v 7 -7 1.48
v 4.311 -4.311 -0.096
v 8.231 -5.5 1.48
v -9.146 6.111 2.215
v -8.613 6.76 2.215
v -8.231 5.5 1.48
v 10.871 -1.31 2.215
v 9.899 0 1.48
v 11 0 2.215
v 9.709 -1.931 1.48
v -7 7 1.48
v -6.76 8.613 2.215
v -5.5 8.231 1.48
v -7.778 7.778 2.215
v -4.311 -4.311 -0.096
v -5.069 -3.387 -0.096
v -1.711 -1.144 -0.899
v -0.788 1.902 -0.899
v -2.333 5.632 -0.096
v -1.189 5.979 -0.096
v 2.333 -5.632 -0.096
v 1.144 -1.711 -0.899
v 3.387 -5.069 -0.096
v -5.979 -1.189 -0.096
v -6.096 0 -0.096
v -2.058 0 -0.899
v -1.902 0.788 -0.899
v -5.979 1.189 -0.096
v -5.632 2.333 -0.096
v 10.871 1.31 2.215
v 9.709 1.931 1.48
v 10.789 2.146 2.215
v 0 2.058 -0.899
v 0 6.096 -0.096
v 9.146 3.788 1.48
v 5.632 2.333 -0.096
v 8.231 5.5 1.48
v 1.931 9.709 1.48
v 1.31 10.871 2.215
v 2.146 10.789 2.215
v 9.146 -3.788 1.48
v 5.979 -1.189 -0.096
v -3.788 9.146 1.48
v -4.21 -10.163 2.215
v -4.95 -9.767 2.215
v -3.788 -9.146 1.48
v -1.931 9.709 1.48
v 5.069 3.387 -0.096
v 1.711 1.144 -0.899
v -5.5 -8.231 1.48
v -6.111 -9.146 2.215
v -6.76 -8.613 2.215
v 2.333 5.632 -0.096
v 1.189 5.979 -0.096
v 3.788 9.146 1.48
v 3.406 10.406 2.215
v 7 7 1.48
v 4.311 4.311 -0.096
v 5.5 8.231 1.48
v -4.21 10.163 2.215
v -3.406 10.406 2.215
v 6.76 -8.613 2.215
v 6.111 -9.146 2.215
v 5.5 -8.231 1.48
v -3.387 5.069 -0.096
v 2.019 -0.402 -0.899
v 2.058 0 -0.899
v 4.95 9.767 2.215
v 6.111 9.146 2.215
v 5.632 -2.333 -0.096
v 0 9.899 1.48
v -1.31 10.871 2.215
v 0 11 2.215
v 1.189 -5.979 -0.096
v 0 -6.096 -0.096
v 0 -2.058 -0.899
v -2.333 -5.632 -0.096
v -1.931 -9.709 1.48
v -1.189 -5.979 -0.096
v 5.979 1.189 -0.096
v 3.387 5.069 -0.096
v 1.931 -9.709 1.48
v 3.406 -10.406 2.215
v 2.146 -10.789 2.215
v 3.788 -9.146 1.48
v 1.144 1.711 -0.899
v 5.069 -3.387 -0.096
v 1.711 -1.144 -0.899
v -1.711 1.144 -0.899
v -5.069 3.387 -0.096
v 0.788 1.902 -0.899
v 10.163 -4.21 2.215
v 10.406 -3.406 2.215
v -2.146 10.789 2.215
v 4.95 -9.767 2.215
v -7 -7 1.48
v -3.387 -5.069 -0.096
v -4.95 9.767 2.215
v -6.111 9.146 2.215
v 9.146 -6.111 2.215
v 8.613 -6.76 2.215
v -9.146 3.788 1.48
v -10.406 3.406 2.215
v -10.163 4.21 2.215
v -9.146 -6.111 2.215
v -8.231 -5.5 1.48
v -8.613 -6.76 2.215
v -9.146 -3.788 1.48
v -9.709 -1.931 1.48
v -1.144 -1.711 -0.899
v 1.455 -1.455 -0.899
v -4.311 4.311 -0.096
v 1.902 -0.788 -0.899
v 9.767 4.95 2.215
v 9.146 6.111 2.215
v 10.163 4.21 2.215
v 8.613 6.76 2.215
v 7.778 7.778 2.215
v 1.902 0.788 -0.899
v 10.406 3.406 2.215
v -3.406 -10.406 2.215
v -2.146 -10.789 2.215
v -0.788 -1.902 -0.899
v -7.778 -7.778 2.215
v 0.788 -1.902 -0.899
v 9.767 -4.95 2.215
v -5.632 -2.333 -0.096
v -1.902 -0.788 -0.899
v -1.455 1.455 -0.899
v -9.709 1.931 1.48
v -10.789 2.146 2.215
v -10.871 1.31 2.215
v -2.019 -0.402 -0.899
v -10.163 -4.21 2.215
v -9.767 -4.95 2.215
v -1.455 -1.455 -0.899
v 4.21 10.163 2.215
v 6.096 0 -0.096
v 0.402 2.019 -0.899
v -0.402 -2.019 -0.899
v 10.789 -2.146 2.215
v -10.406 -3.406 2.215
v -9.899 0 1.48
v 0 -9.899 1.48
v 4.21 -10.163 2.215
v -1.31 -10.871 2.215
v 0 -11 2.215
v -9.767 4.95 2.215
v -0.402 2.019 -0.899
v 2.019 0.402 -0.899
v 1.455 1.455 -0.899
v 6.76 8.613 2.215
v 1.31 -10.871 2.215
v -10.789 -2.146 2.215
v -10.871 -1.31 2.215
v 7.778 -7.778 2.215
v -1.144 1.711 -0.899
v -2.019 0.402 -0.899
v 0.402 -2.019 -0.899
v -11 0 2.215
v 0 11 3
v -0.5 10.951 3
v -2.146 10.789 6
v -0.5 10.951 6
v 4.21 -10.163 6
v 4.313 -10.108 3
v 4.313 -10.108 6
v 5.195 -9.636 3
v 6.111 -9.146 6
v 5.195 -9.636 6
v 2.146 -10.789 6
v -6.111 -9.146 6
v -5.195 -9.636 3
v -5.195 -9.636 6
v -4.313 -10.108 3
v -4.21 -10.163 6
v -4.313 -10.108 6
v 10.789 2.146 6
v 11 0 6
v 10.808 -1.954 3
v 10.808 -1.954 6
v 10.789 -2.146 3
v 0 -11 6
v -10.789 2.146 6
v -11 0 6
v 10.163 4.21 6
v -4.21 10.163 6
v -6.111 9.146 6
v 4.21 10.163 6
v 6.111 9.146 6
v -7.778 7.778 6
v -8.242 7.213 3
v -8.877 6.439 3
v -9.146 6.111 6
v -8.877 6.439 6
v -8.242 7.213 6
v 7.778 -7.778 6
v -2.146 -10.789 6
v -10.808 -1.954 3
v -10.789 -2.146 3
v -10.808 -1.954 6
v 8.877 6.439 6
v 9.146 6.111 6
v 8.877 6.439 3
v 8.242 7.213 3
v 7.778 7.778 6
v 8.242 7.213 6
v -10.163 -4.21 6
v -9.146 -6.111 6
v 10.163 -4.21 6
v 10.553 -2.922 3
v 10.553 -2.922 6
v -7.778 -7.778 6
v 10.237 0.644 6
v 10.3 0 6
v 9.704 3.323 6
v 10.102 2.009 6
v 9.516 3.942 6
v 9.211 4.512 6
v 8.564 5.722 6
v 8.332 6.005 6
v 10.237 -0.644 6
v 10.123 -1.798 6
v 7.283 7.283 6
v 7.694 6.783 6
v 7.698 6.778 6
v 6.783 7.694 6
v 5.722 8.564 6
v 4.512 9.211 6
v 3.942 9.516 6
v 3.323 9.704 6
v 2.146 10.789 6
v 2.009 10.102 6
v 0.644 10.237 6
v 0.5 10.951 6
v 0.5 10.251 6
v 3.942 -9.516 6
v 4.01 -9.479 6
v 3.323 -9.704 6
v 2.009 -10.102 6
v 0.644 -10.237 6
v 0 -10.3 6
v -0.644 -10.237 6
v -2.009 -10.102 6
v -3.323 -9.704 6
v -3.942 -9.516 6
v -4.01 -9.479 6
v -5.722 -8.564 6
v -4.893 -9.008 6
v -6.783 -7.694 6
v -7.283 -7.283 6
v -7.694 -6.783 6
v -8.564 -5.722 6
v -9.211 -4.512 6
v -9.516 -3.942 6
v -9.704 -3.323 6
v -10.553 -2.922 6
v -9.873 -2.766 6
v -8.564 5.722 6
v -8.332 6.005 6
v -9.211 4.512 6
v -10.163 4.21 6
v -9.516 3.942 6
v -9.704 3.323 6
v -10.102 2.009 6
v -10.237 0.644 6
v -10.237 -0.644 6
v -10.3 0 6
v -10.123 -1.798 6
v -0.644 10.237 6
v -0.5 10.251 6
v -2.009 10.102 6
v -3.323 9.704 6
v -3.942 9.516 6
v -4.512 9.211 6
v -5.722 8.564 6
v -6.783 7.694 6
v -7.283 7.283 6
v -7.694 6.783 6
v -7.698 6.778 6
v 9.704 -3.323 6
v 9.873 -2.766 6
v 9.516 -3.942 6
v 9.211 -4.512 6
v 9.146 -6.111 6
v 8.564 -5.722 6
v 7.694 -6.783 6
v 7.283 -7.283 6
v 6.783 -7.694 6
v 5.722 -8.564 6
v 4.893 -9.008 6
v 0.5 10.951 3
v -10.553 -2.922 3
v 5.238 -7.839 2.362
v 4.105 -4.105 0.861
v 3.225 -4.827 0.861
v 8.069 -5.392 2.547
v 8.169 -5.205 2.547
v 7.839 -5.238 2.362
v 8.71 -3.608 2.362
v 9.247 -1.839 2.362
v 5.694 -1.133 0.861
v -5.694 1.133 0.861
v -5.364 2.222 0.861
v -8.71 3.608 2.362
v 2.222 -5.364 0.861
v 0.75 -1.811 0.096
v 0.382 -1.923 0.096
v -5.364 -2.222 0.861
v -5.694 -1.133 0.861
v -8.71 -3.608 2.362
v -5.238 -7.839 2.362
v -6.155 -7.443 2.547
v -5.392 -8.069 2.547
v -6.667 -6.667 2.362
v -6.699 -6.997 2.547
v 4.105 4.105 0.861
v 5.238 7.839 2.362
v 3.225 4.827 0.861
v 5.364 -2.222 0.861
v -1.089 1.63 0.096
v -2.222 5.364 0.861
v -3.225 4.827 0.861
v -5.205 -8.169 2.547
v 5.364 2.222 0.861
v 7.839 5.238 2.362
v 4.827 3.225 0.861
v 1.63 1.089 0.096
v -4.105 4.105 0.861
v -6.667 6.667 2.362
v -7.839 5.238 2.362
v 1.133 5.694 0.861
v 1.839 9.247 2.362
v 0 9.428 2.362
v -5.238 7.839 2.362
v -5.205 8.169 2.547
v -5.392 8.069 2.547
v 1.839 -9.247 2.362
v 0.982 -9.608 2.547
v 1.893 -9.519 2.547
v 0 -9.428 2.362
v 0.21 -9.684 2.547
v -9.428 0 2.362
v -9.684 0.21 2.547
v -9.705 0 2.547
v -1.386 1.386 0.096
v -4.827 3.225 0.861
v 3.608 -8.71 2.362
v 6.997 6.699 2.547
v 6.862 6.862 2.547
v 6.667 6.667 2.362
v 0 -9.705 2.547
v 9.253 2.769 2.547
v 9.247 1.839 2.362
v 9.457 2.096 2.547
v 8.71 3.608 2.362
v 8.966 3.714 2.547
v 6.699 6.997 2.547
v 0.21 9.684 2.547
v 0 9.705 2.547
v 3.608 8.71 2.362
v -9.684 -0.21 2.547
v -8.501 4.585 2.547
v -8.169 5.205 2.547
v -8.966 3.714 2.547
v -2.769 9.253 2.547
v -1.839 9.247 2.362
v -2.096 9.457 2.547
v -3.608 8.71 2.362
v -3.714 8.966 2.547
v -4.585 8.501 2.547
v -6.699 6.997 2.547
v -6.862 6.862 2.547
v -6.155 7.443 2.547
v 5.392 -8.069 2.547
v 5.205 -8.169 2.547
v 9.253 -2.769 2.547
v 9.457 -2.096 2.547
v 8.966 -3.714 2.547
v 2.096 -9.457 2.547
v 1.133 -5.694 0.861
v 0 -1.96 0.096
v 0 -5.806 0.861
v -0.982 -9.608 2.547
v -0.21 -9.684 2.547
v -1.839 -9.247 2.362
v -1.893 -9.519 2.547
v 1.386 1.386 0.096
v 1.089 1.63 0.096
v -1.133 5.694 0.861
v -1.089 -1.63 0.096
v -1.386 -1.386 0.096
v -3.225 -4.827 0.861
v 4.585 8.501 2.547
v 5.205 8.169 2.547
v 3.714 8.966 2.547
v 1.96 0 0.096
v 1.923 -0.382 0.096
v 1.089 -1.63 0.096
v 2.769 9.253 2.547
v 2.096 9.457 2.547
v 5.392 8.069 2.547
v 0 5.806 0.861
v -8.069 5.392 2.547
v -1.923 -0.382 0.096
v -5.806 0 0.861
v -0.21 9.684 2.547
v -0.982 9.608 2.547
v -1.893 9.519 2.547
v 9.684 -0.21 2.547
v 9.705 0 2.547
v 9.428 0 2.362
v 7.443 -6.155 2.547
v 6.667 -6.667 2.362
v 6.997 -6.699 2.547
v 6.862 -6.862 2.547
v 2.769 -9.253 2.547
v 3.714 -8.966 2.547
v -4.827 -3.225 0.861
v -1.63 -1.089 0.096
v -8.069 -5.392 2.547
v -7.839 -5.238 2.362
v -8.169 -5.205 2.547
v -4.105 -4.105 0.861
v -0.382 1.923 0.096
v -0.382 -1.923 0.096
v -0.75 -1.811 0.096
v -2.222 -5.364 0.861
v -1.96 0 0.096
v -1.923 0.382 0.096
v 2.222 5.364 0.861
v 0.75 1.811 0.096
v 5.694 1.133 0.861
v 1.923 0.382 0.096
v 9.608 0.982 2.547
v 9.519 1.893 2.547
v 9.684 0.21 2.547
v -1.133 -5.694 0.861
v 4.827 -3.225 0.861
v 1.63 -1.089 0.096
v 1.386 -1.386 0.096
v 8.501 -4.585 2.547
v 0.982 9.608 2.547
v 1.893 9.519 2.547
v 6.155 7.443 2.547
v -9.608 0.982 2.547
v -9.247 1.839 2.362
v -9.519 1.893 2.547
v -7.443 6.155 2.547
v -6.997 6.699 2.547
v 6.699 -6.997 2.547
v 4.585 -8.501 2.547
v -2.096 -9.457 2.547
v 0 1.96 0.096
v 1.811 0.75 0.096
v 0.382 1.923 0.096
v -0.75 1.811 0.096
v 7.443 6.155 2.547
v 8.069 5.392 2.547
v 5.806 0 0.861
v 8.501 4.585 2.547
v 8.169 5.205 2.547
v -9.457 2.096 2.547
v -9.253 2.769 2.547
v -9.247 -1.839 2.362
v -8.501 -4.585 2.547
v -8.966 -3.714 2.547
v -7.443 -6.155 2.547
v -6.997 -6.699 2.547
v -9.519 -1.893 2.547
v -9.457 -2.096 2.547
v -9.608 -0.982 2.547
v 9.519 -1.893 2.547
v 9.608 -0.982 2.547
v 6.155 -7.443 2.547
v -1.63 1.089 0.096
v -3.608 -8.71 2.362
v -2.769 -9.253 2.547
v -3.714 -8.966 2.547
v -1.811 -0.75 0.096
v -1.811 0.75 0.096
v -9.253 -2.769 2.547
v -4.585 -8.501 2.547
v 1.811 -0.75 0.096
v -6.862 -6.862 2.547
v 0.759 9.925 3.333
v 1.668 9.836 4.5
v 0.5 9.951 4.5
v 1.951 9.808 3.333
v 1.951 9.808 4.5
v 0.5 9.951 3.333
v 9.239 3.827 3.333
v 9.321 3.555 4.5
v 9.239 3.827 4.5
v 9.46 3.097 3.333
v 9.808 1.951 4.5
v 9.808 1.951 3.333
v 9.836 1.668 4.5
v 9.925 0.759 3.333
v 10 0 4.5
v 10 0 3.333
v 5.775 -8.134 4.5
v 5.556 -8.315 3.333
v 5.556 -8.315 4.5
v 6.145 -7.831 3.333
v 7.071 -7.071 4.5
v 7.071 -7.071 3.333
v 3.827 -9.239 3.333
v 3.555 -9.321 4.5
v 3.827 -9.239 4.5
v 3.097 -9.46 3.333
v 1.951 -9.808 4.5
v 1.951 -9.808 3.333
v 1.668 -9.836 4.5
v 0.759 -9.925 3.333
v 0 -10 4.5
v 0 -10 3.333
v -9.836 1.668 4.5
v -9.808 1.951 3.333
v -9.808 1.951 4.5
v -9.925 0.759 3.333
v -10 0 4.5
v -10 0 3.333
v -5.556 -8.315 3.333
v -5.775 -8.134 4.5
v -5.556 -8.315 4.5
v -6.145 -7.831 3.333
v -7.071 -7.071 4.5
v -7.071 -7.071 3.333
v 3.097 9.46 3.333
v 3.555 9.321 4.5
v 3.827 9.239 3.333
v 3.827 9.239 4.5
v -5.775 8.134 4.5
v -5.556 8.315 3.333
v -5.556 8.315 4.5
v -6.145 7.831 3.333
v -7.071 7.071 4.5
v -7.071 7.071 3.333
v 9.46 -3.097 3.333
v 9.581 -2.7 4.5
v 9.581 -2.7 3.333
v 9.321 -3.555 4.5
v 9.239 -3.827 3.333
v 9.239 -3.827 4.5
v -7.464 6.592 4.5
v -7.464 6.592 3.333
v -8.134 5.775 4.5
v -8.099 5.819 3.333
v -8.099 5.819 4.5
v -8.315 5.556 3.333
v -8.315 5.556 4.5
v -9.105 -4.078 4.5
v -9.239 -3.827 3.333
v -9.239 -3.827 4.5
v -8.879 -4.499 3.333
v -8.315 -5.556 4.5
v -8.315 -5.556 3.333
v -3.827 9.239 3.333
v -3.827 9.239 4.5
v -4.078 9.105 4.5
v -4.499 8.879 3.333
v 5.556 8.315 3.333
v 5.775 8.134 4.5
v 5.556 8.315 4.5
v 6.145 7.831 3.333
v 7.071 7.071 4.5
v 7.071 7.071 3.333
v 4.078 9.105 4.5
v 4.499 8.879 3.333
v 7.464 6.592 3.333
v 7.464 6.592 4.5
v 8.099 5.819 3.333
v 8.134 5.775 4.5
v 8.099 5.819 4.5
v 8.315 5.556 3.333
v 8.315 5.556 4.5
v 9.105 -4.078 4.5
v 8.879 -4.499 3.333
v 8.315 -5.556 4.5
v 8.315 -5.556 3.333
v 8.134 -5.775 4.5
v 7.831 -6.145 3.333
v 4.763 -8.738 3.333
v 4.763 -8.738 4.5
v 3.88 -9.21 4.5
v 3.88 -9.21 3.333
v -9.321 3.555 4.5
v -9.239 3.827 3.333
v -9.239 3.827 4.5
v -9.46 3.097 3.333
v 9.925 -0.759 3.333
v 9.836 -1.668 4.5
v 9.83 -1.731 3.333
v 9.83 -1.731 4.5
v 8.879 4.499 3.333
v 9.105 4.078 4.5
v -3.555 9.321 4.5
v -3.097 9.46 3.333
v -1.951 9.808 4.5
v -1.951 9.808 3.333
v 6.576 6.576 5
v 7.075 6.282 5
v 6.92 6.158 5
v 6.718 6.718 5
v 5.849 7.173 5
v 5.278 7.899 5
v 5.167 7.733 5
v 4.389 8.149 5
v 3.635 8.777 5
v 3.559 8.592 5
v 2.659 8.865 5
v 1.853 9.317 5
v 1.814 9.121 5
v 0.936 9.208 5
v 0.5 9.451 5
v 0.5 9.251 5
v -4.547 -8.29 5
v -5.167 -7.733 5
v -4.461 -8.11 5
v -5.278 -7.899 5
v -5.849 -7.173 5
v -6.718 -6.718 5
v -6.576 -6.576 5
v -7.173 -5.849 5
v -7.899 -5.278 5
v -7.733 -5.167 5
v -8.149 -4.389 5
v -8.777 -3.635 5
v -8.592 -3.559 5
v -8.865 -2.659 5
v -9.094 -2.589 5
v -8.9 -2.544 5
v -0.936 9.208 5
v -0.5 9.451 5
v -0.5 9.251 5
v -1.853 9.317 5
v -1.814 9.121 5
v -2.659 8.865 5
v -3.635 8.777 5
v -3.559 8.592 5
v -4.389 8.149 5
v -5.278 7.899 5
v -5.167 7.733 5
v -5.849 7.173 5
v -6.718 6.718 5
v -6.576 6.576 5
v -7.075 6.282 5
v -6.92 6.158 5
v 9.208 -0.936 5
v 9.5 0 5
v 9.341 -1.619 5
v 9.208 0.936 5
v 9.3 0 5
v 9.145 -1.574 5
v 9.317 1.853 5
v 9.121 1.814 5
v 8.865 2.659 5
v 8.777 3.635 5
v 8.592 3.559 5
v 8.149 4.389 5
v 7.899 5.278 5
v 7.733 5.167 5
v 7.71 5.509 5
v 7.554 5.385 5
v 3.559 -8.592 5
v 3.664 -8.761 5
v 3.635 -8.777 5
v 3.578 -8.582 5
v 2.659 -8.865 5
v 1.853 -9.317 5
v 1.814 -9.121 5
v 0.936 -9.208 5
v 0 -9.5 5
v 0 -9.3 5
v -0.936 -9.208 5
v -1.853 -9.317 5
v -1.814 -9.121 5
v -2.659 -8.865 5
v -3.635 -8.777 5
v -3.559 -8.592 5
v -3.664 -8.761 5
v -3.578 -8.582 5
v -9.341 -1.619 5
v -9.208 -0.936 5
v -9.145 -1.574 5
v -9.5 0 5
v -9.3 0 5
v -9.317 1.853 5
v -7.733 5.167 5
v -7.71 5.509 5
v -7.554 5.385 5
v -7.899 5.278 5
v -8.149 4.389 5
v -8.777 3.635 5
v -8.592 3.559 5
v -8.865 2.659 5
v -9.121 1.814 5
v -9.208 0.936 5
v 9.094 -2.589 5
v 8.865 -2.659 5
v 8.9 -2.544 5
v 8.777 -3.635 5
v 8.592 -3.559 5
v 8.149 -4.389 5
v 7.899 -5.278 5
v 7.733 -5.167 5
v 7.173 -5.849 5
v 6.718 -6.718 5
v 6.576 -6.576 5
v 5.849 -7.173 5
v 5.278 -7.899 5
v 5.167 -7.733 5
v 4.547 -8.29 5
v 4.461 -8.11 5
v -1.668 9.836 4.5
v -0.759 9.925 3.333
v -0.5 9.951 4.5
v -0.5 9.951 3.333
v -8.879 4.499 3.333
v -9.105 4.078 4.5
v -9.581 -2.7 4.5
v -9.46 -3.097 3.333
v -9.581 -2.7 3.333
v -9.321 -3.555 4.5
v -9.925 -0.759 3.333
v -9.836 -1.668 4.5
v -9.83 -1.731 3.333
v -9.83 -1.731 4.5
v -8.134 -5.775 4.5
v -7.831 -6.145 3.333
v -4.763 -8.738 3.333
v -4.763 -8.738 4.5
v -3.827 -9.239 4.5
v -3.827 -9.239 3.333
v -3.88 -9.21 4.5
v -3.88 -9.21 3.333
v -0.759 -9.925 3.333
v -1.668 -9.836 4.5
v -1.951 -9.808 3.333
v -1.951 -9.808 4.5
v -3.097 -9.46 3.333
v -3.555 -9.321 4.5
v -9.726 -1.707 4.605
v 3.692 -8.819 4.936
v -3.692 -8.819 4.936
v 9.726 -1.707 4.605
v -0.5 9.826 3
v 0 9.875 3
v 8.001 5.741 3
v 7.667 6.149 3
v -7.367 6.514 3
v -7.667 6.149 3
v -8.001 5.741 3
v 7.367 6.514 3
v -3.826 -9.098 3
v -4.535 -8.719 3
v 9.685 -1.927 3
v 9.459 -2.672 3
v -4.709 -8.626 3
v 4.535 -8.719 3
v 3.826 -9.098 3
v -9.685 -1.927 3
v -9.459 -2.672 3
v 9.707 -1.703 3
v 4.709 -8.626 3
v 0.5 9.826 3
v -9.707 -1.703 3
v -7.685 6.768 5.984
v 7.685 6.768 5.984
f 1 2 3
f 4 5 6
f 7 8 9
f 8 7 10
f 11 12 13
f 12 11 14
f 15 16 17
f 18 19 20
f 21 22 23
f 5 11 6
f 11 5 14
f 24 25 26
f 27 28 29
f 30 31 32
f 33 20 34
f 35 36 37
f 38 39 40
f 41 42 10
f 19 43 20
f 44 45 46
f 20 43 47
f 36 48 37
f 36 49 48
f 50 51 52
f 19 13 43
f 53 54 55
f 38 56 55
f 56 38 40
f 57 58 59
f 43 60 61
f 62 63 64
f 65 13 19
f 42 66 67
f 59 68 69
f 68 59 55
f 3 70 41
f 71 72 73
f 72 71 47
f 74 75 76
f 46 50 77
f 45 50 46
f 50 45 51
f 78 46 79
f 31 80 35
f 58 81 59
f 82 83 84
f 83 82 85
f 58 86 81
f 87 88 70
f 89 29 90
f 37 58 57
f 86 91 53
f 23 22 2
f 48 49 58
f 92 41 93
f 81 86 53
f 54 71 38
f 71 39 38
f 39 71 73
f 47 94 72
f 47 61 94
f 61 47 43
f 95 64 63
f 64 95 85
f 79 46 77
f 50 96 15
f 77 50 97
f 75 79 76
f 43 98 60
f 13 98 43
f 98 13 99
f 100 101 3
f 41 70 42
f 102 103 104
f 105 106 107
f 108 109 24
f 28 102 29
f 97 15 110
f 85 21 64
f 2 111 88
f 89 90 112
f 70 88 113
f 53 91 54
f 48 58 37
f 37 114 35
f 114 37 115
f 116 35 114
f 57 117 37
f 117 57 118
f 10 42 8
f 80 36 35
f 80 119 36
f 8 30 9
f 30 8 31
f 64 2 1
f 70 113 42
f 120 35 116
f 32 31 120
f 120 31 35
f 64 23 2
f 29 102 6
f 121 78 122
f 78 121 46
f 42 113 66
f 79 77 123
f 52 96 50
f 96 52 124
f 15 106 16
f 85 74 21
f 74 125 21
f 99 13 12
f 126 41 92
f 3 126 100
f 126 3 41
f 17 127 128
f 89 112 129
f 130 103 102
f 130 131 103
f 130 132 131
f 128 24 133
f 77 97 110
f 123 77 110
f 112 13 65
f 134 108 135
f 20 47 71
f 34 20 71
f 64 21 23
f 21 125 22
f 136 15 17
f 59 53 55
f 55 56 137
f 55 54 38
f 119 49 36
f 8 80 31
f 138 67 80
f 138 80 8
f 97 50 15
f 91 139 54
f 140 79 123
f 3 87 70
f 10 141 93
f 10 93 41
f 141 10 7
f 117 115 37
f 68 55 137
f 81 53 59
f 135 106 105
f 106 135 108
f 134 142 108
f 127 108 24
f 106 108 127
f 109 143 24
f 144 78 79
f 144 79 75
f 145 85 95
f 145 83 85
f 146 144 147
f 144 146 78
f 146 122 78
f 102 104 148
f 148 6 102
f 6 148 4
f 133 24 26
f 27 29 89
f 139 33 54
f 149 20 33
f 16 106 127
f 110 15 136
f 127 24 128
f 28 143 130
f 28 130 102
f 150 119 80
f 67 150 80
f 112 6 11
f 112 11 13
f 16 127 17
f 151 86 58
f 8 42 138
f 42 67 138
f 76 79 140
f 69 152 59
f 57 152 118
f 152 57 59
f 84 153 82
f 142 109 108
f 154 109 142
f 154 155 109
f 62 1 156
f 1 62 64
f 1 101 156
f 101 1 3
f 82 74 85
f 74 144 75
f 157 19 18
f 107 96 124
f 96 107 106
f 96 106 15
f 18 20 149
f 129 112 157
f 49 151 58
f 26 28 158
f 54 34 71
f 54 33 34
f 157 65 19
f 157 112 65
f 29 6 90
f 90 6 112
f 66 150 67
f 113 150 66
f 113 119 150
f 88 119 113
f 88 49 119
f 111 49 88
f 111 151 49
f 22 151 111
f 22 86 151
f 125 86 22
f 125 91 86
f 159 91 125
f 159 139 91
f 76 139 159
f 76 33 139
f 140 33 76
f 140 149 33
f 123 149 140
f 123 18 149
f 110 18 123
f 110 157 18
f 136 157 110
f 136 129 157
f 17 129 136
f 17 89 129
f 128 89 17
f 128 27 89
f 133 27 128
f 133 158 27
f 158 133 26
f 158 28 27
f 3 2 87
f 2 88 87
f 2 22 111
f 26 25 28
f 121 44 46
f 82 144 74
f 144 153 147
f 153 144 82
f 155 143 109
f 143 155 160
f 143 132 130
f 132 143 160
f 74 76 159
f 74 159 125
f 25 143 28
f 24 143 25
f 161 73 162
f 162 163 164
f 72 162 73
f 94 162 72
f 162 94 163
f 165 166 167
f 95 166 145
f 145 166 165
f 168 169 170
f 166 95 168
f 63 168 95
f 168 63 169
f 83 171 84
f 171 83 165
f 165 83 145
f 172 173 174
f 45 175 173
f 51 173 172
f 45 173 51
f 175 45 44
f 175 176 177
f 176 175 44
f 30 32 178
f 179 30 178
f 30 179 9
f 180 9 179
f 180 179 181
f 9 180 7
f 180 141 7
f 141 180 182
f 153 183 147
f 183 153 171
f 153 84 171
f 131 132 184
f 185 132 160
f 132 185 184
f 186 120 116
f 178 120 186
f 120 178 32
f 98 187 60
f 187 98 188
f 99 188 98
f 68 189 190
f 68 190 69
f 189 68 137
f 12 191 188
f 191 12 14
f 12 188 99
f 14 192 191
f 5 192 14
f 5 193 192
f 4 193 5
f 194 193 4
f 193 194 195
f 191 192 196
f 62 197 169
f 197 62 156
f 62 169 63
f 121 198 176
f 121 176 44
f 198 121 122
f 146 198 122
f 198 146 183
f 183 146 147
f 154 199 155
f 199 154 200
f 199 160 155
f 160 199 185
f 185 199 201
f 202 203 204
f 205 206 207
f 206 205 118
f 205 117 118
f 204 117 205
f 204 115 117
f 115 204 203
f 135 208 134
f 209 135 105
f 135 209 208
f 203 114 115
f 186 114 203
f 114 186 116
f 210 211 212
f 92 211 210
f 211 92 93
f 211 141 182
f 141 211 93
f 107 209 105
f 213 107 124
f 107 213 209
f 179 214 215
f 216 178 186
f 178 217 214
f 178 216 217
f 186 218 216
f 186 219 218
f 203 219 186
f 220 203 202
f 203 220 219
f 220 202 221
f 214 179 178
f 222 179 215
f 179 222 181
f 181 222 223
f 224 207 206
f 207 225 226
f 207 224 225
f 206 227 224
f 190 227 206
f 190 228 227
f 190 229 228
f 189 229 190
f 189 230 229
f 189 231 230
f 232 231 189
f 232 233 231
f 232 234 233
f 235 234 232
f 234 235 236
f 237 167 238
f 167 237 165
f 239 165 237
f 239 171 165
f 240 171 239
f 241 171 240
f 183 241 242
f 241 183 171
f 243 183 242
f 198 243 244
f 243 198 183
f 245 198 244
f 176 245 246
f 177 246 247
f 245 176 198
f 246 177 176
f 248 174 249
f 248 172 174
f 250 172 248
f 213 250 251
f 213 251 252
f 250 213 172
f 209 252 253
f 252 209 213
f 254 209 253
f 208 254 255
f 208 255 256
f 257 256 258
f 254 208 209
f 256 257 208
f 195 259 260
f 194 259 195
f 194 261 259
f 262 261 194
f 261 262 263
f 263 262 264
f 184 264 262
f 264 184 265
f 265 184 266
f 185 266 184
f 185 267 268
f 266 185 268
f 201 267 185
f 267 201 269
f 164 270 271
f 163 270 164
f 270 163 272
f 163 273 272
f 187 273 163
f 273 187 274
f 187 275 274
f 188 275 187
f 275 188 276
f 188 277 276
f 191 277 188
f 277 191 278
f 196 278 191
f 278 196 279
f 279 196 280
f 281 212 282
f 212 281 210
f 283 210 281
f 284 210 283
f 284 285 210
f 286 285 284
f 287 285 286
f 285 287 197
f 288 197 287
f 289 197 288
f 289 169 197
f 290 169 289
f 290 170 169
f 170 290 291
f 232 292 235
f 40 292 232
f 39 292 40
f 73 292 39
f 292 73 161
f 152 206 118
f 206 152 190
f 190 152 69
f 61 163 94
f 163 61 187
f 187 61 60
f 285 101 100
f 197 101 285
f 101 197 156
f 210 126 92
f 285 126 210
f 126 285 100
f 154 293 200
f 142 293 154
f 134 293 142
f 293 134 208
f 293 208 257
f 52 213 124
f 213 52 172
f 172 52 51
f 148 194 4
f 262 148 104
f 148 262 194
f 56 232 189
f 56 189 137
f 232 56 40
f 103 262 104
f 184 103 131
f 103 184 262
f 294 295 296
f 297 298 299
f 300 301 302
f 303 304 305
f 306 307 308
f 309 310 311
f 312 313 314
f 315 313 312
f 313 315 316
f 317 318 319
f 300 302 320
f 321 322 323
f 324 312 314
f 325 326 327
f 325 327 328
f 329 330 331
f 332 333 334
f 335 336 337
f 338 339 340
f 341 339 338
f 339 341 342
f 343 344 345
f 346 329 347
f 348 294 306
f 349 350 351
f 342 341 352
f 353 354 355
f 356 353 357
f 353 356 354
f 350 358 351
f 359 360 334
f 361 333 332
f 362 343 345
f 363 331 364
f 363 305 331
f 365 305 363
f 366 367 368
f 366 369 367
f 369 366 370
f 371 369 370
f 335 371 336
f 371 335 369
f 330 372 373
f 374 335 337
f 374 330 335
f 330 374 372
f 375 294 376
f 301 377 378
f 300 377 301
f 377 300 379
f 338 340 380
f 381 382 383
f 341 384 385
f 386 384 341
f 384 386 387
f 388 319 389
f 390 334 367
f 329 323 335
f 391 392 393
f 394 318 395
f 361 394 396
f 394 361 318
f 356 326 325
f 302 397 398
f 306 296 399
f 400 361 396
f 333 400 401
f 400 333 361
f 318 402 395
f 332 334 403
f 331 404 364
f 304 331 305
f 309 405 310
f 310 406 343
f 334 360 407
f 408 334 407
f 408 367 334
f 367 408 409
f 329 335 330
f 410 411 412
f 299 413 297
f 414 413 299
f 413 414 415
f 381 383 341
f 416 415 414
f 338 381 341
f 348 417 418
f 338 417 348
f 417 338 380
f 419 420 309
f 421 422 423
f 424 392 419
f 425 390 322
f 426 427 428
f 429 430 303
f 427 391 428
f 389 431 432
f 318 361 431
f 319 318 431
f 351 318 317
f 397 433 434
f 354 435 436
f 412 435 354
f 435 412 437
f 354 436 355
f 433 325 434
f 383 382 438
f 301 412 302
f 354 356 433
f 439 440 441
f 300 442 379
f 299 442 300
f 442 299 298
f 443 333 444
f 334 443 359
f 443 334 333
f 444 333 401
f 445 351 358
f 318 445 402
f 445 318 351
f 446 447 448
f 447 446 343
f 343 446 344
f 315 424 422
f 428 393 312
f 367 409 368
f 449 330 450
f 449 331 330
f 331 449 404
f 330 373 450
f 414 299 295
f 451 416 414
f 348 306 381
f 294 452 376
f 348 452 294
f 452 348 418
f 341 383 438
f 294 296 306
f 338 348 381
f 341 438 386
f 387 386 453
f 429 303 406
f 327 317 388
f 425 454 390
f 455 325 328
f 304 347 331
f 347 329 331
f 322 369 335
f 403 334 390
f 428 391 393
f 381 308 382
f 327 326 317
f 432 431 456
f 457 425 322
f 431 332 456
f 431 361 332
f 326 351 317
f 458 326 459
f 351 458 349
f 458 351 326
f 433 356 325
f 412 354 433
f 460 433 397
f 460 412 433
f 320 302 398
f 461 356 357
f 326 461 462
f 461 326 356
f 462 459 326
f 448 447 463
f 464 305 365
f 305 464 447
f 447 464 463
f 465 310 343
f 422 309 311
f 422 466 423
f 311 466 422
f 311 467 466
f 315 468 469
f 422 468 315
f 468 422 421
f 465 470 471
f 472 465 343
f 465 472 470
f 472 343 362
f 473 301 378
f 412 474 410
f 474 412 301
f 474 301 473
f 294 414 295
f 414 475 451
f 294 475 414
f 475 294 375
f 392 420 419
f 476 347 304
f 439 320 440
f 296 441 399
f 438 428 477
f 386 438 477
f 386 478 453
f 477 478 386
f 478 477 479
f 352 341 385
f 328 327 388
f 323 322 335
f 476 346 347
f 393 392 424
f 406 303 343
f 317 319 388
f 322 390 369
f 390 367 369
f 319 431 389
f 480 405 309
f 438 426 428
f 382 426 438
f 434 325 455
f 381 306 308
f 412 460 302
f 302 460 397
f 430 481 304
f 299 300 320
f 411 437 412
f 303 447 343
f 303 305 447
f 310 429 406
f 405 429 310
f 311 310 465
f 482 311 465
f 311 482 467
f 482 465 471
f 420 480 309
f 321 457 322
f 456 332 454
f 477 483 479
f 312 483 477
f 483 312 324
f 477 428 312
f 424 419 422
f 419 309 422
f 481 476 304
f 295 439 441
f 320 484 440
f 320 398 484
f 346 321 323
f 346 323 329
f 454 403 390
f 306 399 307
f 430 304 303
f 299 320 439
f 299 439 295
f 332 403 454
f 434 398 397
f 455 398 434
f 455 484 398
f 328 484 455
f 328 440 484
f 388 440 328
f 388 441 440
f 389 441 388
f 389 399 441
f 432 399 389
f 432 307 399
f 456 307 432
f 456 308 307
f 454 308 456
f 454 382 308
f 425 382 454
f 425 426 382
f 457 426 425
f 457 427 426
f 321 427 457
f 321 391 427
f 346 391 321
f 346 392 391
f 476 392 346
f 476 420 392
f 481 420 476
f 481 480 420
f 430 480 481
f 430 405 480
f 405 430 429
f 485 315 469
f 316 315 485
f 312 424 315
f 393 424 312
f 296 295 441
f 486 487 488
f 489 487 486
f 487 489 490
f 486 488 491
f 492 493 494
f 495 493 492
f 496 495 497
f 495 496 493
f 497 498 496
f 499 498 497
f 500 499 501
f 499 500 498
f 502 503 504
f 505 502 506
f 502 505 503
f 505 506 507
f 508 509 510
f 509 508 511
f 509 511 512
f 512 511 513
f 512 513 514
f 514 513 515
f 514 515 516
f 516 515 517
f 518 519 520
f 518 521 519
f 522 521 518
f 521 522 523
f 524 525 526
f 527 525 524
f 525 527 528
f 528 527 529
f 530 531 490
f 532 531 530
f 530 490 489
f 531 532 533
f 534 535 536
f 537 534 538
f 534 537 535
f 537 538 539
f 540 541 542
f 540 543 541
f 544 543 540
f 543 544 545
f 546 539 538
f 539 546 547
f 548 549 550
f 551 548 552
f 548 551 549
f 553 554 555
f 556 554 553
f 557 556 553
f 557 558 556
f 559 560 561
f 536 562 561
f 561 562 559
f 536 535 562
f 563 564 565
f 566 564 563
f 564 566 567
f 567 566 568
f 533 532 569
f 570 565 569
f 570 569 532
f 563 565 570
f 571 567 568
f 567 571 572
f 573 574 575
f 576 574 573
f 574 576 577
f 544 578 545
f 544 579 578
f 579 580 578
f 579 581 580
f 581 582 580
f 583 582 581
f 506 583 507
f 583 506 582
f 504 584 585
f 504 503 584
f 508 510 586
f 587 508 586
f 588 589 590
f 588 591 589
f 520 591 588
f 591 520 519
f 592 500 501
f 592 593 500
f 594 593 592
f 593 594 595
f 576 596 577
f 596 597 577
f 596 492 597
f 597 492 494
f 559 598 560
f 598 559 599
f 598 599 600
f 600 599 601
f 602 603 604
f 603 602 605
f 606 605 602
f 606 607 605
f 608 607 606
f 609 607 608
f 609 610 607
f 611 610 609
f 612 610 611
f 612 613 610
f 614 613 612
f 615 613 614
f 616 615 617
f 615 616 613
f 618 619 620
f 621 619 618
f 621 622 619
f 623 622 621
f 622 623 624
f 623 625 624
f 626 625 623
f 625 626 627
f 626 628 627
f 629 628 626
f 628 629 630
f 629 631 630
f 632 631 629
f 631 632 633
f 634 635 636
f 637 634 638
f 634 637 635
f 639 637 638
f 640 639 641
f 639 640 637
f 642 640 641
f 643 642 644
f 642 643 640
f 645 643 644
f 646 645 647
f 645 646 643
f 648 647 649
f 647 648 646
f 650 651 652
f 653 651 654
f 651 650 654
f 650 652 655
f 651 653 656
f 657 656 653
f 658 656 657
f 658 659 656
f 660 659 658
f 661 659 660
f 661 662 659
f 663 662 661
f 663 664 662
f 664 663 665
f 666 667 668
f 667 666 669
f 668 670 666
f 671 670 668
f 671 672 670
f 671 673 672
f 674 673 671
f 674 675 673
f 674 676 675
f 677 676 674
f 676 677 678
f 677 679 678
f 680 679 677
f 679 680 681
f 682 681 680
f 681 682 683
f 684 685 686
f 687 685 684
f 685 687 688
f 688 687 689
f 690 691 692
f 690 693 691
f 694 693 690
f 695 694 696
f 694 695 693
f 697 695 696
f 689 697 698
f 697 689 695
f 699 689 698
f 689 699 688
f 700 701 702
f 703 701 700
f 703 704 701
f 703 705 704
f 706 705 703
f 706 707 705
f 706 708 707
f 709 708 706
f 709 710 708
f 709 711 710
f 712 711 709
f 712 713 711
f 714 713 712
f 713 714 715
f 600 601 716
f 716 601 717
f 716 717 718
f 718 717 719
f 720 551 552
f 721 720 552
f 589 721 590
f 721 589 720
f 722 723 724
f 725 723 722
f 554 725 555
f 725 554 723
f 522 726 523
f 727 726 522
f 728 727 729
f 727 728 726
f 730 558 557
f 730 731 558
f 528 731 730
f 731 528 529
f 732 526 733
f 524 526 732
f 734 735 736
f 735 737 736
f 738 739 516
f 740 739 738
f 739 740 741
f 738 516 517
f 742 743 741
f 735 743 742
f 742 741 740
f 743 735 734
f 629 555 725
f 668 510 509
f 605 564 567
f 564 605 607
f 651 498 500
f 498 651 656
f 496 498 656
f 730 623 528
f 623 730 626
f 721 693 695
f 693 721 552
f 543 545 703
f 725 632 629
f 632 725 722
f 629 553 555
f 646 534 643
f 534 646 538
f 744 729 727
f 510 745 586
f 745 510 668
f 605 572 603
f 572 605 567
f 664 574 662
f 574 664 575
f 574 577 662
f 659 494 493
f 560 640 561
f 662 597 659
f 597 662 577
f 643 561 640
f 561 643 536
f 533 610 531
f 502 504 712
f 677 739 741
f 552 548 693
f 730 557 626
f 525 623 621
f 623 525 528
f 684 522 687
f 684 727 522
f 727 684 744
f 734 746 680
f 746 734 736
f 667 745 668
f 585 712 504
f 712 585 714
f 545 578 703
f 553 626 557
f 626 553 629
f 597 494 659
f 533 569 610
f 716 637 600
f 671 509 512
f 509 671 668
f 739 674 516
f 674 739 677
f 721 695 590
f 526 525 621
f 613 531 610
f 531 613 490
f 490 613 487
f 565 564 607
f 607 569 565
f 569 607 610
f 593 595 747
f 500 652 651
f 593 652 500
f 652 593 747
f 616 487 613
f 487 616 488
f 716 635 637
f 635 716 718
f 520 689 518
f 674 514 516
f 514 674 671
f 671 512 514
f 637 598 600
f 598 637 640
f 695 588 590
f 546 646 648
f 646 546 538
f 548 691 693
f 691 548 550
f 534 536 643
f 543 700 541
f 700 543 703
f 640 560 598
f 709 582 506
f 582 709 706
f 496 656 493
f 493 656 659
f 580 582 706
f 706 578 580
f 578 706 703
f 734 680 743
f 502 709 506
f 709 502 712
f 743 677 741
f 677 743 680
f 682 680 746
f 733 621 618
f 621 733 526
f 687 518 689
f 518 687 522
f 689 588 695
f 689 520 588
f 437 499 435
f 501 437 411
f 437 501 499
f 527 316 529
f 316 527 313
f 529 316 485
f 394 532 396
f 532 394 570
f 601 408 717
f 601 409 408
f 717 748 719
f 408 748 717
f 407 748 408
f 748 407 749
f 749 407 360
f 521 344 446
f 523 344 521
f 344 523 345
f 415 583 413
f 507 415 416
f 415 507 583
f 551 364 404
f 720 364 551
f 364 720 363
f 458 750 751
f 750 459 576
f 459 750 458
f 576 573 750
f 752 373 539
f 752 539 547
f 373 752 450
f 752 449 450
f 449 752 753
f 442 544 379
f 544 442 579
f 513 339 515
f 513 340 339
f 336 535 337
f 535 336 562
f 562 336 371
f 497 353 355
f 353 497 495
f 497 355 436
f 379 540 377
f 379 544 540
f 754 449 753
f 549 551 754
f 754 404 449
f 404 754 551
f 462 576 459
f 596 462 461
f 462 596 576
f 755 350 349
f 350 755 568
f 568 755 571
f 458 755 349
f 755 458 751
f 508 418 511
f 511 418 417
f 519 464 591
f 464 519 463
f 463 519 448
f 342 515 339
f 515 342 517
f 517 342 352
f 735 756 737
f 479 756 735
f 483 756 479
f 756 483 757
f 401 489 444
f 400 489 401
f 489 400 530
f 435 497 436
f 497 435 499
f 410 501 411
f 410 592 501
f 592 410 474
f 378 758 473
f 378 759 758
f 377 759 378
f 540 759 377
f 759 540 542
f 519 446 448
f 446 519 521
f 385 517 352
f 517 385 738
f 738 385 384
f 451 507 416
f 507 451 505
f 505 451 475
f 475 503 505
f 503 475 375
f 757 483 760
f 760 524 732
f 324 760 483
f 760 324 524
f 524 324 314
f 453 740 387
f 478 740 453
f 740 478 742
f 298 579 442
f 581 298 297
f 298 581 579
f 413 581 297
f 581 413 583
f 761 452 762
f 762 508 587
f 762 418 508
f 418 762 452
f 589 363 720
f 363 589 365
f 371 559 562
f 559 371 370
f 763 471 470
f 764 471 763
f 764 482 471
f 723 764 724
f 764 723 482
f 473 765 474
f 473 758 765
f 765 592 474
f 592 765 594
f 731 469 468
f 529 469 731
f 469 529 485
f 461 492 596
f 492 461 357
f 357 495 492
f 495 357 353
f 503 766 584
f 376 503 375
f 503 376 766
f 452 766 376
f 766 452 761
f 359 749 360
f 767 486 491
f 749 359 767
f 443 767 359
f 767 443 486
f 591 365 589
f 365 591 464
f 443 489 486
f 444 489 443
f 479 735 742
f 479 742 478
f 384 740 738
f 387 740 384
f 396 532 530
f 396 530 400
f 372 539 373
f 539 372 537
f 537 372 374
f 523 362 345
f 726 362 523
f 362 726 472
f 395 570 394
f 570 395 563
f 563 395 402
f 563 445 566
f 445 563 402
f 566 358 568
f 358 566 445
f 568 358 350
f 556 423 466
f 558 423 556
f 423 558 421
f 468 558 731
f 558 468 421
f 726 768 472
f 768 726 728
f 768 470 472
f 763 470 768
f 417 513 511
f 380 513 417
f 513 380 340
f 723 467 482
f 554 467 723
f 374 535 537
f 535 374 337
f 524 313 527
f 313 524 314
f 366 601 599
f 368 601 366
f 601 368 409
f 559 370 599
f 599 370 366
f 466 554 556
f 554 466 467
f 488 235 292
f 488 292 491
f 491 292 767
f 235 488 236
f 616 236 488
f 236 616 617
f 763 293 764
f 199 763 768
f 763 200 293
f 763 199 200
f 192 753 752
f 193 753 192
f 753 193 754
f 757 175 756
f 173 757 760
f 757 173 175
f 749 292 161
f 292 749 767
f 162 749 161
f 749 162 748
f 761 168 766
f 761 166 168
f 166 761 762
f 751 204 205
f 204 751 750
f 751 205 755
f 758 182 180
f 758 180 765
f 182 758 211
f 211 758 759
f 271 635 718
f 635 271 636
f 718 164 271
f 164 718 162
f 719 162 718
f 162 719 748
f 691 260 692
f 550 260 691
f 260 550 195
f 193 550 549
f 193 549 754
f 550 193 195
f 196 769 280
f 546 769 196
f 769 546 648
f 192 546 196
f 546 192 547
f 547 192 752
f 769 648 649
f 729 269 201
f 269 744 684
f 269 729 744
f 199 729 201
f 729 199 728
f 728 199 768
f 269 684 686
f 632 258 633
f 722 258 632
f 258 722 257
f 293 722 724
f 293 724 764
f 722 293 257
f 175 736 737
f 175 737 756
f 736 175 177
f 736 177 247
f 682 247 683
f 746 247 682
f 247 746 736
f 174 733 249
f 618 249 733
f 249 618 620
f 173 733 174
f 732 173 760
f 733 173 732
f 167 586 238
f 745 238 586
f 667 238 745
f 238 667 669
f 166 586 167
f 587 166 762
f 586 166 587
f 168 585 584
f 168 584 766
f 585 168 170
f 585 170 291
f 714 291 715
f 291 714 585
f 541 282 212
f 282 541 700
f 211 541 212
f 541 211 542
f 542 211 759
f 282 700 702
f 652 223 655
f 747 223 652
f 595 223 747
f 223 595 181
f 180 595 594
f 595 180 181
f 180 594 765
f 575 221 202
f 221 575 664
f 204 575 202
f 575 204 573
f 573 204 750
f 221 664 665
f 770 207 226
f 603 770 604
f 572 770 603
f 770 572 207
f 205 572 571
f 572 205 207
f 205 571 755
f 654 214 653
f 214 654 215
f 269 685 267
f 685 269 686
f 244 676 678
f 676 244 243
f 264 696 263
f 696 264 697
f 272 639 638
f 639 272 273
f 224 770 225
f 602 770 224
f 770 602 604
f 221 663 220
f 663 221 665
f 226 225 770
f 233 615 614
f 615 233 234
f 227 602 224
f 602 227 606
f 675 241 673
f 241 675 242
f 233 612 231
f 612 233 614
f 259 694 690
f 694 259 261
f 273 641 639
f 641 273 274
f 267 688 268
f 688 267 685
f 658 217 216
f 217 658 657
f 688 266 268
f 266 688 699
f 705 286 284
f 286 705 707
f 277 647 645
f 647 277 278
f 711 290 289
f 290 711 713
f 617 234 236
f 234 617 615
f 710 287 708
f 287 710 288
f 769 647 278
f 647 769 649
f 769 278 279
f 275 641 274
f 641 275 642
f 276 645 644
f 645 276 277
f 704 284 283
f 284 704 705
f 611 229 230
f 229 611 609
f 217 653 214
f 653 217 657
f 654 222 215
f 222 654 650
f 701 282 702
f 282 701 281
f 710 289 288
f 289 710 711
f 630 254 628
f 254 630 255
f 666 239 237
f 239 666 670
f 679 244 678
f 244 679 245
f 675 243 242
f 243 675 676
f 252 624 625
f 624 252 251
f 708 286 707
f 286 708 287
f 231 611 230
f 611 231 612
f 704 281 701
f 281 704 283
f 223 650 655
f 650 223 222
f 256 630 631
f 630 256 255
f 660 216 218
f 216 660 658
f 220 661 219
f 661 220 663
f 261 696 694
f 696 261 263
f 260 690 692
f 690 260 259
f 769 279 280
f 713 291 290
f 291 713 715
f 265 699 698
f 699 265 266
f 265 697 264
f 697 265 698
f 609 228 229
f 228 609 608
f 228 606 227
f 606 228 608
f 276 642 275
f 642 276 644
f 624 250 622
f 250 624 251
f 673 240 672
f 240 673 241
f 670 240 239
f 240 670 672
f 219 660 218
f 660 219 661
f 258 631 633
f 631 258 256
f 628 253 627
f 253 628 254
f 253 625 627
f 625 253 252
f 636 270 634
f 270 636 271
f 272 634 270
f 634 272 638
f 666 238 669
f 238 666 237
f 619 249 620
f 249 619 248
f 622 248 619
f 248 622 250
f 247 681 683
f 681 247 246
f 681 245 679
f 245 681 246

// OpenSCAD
$fn = 32;
module slotbout_m8()
{
    color("gray")
    union()
    {
        intersection()
        {
            translate([0,0,20])
                sphere(d=40);
            cylinder(d=20, h=5);
            
            cylinder(d1=29, d2=19, h=5);
            cylinder(d1=17.5, d2=22, h=6);
        }
        translate([0,0,6])
            cube([8,8,8], center=true);
        translate([0,0,5])
            cylinder(d=8, h=100);
    }
}

difference(){
    intersection()
    {
        translate([0,0,20])
            sphere(d=42);
        cylinder(d=22, h=12, center=true);
    }
    
    slotbout_m8();
    translate([0,0,3.2])
        cylinder(d1=15,d2=25, h=5);
    for(i=[0:(360/7):360])
    {
        rotate([0,0,i])
        translate([-0.5, 0,3])
            cube([1,30,10]);
    }
    if($preview)
        cube(20);
    
}
